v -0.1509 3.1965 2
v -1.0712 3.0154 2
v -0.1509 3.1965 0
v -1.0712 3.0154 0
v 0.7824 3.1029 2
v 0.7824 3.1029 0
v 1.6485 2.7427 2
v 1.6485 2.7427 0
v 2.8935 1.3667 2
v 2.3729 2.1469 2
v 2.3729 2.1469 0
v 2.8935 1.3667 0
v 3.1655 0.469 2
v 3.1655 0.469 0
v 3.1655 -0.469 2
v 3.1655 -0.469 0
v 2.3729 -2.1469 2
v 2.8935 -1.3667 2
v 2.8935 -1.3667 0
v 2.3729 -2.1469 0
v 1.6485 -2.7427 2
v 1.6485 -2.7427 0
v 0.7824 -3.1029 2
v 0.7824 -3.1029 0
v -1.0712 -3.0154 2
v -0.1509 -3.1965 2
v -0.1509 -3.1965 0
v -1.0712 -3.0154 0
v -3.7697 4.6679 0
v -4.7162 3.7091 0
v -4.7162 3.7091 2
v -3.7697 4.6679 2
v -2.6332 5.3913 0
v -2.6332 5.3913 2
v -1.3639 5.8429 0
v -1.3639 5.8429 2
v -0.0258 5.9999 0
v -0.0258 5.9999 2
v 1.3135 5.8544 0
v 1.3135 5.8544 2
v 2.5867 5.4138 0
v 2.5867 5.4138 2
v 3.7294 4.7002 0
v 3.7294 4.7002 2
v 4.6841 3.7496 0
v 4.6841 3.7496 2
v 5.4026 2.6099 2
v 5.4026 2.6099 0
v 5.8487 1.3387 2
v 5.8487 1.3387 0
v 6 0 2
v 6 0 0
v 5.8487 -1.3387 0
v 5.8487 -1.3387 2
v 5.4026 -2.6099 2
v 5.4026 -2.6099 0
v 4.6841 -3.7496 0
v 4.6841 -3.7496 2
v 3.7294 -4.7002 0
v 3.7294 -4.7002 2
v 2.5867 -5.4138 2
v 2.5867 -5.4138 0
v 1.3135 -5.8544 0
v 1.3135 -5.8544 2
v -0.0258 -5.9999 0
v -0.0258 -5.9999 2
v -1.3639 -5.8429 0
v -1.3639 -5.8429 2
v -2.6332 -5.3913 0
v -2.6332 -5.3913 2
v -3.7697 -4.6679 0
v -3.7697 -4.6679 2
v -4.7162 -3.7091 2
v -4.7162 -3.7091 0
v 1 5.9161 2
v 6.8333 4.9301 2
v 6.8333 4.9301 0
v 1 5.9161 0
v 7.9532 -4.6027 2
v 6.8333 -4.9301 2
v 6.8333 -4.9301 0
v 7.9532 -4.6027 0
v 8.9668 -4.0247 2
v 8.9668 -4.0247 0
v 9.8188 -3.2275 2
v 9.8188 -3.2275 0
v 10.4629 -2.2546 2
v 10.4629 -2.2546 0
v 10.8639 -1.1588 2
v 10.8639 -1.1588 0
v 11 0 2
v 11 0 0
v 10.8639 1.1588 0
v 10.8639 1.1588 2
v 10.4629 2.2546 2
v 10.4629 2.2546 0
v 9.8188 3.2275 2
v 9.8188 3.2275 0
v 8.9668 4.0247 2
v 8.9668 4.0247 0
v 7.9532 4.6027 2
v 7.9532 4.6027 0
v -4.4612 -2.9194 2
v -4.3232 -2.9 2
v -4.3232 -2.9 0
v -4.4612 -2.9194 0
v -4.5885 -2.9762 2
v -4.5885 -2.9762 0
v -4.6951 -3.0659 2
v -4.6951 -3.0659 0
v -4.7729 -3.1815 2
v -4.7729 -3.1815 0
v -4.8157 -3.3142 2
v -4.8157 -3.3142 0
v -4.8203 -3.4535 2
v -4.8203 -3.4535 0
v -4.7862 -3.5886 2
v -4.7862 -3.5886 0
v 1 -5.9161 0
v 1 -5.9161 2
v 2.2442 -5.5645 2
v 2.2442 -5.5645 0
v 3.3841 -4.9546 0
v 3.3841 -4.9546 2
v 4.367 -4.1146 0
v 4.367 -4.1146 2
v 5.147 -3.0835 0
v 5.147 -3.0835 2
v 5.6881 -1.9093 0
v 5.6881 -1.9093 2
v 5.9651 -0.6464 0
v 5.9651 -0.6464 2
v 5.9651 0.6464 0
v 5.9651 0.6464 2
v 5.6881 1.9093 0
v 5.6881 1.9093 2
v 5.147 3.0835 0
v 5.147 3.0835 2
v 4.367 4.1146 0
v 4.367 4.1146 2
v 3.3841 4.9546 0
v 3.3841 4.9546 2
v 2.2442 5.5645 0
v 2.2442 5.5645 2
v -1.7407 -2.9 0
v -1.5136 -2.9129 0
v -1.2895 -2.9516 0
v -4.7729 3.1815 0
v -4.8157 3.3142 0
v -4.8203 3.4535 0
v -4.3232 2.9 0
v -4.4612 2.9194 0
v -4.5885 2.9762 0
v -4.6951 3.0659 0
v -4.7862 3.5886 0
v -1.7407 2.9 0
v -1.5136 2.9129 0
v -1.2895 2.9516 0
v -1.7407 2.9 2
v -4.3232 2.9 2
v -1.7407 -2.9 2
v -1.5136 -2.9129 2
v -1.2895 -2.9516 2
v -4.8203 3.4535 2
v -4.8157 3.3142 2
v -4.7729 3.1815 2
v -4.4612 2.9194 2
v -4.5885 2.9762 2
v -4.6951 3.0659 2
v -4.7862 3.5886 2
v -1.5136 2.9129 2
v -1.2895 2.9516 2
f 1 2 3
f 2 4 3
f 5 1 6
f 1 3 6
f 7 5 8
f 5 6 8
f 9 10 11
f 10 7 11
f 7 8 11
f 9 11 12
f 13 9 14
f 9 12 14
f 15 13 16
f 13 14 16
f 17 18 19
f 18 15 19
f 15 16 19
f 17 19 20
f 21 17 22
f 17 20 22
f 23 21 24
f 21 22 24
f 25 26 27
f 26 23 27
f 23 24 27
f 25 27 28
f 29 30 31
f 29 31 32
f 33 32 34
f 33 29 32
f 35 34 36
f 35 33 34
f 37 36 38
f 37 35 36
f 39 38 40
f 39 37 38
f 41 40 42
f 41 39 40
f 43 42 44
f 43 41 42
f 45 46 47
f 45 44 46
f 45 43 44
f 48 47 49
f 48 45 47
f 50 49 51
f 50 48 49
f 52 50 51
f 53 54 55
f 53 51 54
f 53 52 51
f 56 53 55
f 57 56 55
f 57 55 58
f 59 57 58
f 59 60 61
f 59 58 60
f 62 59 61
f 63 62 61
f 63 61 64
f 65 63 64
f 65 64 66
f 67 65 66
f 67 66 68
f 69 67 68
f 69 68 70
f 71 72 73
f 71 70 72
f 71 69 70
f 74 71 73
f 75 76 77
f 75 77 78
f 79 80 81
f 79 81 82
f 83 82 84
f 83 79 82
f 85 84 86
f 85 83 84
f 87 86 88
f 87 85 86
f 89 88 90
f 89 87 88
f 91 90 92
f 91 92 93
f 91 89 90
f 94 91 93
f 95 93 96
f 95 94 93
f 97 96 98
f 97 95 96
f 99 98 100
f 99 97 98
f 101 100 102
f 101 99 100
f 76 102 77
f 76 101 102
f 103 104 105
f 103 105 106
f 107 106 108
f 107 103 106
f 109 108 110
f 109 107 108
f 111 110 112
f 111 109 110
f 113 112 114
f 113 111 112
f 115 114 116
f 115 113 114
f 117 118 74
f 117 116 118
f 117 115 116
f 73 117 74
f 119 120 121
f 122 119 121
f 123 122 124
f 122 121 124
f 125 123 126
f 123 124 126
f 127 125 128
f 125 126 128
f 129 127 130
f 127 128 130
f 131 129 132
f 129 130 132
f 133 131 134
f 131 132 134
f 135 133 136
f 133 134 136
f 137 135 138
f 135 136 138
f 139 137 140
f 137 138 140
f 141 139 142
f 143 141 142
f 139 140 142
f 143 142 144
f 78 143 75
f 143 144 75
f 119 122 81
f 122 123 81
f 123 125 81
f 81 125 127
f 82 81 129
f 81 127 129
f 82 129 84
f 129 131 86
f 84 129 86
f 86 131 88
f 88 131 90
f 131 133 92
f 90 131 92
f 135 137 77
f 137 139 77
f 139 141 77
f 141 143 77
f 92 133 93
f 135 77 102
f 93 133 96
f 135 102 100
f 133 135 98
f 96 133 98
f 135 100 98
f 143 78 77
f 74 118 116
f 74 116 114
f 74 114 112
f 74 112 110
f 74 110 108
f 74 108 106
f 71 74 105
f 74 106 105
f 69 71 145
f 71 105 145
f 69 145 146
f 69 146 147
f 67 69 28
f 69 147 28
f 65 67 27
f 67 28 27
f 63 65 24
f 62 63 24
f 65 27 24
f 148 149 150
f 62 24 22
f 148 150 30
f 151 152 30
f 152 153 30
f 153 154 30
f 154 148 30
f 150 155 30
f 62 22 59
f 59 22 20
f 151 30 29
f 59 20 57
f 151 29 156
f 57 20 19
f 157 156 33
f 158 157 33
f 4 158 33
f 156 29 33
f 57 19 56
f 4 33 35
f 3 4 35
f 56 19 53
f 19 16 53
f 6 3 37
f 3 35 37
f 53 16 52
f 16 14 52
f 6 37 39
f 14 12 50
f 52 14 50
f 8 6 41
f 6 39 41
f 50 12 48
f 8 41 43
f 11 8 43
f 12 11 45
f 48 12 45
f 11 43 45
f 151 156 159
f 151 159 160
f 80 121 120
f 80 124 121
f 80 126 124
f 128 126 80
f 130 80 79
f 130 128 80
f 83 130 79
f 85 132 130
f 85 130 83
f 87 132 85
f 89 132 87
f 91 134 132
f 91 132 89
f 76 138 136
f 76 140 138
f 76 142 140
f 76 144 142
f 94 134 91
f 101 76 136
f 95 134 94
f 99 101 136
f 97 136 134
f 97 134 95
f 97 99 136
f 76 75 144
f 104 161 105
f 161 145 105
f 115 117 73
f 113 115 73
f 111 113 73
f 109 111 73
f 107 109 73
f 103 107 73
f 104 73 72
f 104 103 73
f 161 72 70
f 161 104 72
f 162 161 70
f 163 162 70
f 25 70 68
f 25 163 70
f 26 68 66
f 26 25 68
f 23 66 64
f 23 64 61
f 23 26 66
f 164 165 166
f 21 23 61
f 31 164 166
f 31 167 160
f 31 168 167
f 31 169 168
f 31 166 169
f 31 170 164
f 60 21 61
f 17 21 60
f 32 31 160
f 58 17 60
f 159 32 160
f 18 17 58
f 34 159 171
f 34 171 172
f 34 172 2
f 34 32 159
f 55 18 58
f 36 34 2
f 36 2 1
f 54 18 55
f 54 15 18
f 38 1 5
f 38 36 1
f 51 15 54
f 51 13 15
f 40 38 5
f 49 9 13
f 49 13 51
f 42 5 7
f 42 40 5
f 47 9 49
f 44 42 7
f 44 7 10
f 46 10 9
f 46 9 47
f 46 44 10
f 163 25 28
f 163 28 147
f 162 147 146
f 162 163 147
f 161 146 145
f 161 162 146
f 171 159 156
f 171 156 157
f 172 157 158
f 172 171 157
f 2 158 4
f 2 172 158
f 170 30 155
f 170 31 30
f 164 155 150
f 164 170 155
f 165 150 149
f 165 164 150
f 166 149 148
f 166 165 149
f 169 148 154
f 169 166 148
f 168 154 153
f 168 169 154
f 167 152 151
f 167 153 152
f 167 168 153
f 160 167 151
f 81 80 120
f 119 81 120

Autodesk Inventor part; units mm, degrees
ref_plane "YZ Plane" through (0, 0, 0) normal (1, 0, 0) x (0, 1, 0)
ref_plane "XZ Plane" through (0, 0, 0) normal (0, 1, 0) x (-1, 0, 0)
ref_plane "XY Plane" through (0, 0, 0) normal (0, 0, 1) x (1, 0, 0)
sketch "Sketch1" plane through (0, 0, 0) normal (0, 0, 1) x (1, 0, 0)
  arc A0 (-1.3528, -2.9) -> (-1.3528, 2.9) centre (0, 0) ccw
  arc A1 (-5.2526, -2.9) -> (-5.2526, 2.9) centre (0, 0) ccw
  line L0 (-1.3528, 2.9) -> (-5.2526, 2.9)
  line L1 (-1.3528, -2.9) -> (-5.2526, -2.9)
  dimension "d0" = 6.4
  dimension "d1" = 12
  dimension "d2" = 5.8
  dimension "d3" = 2.9
extrude "Extrusion1" add sketch "Sketch1" along normal blind 2
fillet "Fillet1" radius 0.5 2 edges at (-5.2526, 2.9, 1) (-5.2526, -2.9, 1)
fillet "Fillet2" radius 2 2 edges at (-1.3528, 2.9, 1) (-1.3528, -2.9, 1)
sketch "Sketch2" plane through (0, 0, 2) normal (0, 0, 1) x (1, 0, 0)
  arc A0 (-4.7162, -3.7091) -> (-4.7162, 3.7091) centre (0, 0) ccw projected
  arc A1 (6.8333, -4.9301) -> (6.8333, 4.9301) centre (6, 0) ccw
  line L0 (6.8333, 4.9301) -> (1, 5.9161)
  line L1 (6.8333, -4.9301) -> (1, -5.9161)
  dimension "d8" = 10
extrude "Extrusion2" add sketch "Sketch2" against normal up to surface (2 mm away)
equation "\"d3\" = 0.5 * d2"
properties part number "BowdenConnectorPlayClip"
